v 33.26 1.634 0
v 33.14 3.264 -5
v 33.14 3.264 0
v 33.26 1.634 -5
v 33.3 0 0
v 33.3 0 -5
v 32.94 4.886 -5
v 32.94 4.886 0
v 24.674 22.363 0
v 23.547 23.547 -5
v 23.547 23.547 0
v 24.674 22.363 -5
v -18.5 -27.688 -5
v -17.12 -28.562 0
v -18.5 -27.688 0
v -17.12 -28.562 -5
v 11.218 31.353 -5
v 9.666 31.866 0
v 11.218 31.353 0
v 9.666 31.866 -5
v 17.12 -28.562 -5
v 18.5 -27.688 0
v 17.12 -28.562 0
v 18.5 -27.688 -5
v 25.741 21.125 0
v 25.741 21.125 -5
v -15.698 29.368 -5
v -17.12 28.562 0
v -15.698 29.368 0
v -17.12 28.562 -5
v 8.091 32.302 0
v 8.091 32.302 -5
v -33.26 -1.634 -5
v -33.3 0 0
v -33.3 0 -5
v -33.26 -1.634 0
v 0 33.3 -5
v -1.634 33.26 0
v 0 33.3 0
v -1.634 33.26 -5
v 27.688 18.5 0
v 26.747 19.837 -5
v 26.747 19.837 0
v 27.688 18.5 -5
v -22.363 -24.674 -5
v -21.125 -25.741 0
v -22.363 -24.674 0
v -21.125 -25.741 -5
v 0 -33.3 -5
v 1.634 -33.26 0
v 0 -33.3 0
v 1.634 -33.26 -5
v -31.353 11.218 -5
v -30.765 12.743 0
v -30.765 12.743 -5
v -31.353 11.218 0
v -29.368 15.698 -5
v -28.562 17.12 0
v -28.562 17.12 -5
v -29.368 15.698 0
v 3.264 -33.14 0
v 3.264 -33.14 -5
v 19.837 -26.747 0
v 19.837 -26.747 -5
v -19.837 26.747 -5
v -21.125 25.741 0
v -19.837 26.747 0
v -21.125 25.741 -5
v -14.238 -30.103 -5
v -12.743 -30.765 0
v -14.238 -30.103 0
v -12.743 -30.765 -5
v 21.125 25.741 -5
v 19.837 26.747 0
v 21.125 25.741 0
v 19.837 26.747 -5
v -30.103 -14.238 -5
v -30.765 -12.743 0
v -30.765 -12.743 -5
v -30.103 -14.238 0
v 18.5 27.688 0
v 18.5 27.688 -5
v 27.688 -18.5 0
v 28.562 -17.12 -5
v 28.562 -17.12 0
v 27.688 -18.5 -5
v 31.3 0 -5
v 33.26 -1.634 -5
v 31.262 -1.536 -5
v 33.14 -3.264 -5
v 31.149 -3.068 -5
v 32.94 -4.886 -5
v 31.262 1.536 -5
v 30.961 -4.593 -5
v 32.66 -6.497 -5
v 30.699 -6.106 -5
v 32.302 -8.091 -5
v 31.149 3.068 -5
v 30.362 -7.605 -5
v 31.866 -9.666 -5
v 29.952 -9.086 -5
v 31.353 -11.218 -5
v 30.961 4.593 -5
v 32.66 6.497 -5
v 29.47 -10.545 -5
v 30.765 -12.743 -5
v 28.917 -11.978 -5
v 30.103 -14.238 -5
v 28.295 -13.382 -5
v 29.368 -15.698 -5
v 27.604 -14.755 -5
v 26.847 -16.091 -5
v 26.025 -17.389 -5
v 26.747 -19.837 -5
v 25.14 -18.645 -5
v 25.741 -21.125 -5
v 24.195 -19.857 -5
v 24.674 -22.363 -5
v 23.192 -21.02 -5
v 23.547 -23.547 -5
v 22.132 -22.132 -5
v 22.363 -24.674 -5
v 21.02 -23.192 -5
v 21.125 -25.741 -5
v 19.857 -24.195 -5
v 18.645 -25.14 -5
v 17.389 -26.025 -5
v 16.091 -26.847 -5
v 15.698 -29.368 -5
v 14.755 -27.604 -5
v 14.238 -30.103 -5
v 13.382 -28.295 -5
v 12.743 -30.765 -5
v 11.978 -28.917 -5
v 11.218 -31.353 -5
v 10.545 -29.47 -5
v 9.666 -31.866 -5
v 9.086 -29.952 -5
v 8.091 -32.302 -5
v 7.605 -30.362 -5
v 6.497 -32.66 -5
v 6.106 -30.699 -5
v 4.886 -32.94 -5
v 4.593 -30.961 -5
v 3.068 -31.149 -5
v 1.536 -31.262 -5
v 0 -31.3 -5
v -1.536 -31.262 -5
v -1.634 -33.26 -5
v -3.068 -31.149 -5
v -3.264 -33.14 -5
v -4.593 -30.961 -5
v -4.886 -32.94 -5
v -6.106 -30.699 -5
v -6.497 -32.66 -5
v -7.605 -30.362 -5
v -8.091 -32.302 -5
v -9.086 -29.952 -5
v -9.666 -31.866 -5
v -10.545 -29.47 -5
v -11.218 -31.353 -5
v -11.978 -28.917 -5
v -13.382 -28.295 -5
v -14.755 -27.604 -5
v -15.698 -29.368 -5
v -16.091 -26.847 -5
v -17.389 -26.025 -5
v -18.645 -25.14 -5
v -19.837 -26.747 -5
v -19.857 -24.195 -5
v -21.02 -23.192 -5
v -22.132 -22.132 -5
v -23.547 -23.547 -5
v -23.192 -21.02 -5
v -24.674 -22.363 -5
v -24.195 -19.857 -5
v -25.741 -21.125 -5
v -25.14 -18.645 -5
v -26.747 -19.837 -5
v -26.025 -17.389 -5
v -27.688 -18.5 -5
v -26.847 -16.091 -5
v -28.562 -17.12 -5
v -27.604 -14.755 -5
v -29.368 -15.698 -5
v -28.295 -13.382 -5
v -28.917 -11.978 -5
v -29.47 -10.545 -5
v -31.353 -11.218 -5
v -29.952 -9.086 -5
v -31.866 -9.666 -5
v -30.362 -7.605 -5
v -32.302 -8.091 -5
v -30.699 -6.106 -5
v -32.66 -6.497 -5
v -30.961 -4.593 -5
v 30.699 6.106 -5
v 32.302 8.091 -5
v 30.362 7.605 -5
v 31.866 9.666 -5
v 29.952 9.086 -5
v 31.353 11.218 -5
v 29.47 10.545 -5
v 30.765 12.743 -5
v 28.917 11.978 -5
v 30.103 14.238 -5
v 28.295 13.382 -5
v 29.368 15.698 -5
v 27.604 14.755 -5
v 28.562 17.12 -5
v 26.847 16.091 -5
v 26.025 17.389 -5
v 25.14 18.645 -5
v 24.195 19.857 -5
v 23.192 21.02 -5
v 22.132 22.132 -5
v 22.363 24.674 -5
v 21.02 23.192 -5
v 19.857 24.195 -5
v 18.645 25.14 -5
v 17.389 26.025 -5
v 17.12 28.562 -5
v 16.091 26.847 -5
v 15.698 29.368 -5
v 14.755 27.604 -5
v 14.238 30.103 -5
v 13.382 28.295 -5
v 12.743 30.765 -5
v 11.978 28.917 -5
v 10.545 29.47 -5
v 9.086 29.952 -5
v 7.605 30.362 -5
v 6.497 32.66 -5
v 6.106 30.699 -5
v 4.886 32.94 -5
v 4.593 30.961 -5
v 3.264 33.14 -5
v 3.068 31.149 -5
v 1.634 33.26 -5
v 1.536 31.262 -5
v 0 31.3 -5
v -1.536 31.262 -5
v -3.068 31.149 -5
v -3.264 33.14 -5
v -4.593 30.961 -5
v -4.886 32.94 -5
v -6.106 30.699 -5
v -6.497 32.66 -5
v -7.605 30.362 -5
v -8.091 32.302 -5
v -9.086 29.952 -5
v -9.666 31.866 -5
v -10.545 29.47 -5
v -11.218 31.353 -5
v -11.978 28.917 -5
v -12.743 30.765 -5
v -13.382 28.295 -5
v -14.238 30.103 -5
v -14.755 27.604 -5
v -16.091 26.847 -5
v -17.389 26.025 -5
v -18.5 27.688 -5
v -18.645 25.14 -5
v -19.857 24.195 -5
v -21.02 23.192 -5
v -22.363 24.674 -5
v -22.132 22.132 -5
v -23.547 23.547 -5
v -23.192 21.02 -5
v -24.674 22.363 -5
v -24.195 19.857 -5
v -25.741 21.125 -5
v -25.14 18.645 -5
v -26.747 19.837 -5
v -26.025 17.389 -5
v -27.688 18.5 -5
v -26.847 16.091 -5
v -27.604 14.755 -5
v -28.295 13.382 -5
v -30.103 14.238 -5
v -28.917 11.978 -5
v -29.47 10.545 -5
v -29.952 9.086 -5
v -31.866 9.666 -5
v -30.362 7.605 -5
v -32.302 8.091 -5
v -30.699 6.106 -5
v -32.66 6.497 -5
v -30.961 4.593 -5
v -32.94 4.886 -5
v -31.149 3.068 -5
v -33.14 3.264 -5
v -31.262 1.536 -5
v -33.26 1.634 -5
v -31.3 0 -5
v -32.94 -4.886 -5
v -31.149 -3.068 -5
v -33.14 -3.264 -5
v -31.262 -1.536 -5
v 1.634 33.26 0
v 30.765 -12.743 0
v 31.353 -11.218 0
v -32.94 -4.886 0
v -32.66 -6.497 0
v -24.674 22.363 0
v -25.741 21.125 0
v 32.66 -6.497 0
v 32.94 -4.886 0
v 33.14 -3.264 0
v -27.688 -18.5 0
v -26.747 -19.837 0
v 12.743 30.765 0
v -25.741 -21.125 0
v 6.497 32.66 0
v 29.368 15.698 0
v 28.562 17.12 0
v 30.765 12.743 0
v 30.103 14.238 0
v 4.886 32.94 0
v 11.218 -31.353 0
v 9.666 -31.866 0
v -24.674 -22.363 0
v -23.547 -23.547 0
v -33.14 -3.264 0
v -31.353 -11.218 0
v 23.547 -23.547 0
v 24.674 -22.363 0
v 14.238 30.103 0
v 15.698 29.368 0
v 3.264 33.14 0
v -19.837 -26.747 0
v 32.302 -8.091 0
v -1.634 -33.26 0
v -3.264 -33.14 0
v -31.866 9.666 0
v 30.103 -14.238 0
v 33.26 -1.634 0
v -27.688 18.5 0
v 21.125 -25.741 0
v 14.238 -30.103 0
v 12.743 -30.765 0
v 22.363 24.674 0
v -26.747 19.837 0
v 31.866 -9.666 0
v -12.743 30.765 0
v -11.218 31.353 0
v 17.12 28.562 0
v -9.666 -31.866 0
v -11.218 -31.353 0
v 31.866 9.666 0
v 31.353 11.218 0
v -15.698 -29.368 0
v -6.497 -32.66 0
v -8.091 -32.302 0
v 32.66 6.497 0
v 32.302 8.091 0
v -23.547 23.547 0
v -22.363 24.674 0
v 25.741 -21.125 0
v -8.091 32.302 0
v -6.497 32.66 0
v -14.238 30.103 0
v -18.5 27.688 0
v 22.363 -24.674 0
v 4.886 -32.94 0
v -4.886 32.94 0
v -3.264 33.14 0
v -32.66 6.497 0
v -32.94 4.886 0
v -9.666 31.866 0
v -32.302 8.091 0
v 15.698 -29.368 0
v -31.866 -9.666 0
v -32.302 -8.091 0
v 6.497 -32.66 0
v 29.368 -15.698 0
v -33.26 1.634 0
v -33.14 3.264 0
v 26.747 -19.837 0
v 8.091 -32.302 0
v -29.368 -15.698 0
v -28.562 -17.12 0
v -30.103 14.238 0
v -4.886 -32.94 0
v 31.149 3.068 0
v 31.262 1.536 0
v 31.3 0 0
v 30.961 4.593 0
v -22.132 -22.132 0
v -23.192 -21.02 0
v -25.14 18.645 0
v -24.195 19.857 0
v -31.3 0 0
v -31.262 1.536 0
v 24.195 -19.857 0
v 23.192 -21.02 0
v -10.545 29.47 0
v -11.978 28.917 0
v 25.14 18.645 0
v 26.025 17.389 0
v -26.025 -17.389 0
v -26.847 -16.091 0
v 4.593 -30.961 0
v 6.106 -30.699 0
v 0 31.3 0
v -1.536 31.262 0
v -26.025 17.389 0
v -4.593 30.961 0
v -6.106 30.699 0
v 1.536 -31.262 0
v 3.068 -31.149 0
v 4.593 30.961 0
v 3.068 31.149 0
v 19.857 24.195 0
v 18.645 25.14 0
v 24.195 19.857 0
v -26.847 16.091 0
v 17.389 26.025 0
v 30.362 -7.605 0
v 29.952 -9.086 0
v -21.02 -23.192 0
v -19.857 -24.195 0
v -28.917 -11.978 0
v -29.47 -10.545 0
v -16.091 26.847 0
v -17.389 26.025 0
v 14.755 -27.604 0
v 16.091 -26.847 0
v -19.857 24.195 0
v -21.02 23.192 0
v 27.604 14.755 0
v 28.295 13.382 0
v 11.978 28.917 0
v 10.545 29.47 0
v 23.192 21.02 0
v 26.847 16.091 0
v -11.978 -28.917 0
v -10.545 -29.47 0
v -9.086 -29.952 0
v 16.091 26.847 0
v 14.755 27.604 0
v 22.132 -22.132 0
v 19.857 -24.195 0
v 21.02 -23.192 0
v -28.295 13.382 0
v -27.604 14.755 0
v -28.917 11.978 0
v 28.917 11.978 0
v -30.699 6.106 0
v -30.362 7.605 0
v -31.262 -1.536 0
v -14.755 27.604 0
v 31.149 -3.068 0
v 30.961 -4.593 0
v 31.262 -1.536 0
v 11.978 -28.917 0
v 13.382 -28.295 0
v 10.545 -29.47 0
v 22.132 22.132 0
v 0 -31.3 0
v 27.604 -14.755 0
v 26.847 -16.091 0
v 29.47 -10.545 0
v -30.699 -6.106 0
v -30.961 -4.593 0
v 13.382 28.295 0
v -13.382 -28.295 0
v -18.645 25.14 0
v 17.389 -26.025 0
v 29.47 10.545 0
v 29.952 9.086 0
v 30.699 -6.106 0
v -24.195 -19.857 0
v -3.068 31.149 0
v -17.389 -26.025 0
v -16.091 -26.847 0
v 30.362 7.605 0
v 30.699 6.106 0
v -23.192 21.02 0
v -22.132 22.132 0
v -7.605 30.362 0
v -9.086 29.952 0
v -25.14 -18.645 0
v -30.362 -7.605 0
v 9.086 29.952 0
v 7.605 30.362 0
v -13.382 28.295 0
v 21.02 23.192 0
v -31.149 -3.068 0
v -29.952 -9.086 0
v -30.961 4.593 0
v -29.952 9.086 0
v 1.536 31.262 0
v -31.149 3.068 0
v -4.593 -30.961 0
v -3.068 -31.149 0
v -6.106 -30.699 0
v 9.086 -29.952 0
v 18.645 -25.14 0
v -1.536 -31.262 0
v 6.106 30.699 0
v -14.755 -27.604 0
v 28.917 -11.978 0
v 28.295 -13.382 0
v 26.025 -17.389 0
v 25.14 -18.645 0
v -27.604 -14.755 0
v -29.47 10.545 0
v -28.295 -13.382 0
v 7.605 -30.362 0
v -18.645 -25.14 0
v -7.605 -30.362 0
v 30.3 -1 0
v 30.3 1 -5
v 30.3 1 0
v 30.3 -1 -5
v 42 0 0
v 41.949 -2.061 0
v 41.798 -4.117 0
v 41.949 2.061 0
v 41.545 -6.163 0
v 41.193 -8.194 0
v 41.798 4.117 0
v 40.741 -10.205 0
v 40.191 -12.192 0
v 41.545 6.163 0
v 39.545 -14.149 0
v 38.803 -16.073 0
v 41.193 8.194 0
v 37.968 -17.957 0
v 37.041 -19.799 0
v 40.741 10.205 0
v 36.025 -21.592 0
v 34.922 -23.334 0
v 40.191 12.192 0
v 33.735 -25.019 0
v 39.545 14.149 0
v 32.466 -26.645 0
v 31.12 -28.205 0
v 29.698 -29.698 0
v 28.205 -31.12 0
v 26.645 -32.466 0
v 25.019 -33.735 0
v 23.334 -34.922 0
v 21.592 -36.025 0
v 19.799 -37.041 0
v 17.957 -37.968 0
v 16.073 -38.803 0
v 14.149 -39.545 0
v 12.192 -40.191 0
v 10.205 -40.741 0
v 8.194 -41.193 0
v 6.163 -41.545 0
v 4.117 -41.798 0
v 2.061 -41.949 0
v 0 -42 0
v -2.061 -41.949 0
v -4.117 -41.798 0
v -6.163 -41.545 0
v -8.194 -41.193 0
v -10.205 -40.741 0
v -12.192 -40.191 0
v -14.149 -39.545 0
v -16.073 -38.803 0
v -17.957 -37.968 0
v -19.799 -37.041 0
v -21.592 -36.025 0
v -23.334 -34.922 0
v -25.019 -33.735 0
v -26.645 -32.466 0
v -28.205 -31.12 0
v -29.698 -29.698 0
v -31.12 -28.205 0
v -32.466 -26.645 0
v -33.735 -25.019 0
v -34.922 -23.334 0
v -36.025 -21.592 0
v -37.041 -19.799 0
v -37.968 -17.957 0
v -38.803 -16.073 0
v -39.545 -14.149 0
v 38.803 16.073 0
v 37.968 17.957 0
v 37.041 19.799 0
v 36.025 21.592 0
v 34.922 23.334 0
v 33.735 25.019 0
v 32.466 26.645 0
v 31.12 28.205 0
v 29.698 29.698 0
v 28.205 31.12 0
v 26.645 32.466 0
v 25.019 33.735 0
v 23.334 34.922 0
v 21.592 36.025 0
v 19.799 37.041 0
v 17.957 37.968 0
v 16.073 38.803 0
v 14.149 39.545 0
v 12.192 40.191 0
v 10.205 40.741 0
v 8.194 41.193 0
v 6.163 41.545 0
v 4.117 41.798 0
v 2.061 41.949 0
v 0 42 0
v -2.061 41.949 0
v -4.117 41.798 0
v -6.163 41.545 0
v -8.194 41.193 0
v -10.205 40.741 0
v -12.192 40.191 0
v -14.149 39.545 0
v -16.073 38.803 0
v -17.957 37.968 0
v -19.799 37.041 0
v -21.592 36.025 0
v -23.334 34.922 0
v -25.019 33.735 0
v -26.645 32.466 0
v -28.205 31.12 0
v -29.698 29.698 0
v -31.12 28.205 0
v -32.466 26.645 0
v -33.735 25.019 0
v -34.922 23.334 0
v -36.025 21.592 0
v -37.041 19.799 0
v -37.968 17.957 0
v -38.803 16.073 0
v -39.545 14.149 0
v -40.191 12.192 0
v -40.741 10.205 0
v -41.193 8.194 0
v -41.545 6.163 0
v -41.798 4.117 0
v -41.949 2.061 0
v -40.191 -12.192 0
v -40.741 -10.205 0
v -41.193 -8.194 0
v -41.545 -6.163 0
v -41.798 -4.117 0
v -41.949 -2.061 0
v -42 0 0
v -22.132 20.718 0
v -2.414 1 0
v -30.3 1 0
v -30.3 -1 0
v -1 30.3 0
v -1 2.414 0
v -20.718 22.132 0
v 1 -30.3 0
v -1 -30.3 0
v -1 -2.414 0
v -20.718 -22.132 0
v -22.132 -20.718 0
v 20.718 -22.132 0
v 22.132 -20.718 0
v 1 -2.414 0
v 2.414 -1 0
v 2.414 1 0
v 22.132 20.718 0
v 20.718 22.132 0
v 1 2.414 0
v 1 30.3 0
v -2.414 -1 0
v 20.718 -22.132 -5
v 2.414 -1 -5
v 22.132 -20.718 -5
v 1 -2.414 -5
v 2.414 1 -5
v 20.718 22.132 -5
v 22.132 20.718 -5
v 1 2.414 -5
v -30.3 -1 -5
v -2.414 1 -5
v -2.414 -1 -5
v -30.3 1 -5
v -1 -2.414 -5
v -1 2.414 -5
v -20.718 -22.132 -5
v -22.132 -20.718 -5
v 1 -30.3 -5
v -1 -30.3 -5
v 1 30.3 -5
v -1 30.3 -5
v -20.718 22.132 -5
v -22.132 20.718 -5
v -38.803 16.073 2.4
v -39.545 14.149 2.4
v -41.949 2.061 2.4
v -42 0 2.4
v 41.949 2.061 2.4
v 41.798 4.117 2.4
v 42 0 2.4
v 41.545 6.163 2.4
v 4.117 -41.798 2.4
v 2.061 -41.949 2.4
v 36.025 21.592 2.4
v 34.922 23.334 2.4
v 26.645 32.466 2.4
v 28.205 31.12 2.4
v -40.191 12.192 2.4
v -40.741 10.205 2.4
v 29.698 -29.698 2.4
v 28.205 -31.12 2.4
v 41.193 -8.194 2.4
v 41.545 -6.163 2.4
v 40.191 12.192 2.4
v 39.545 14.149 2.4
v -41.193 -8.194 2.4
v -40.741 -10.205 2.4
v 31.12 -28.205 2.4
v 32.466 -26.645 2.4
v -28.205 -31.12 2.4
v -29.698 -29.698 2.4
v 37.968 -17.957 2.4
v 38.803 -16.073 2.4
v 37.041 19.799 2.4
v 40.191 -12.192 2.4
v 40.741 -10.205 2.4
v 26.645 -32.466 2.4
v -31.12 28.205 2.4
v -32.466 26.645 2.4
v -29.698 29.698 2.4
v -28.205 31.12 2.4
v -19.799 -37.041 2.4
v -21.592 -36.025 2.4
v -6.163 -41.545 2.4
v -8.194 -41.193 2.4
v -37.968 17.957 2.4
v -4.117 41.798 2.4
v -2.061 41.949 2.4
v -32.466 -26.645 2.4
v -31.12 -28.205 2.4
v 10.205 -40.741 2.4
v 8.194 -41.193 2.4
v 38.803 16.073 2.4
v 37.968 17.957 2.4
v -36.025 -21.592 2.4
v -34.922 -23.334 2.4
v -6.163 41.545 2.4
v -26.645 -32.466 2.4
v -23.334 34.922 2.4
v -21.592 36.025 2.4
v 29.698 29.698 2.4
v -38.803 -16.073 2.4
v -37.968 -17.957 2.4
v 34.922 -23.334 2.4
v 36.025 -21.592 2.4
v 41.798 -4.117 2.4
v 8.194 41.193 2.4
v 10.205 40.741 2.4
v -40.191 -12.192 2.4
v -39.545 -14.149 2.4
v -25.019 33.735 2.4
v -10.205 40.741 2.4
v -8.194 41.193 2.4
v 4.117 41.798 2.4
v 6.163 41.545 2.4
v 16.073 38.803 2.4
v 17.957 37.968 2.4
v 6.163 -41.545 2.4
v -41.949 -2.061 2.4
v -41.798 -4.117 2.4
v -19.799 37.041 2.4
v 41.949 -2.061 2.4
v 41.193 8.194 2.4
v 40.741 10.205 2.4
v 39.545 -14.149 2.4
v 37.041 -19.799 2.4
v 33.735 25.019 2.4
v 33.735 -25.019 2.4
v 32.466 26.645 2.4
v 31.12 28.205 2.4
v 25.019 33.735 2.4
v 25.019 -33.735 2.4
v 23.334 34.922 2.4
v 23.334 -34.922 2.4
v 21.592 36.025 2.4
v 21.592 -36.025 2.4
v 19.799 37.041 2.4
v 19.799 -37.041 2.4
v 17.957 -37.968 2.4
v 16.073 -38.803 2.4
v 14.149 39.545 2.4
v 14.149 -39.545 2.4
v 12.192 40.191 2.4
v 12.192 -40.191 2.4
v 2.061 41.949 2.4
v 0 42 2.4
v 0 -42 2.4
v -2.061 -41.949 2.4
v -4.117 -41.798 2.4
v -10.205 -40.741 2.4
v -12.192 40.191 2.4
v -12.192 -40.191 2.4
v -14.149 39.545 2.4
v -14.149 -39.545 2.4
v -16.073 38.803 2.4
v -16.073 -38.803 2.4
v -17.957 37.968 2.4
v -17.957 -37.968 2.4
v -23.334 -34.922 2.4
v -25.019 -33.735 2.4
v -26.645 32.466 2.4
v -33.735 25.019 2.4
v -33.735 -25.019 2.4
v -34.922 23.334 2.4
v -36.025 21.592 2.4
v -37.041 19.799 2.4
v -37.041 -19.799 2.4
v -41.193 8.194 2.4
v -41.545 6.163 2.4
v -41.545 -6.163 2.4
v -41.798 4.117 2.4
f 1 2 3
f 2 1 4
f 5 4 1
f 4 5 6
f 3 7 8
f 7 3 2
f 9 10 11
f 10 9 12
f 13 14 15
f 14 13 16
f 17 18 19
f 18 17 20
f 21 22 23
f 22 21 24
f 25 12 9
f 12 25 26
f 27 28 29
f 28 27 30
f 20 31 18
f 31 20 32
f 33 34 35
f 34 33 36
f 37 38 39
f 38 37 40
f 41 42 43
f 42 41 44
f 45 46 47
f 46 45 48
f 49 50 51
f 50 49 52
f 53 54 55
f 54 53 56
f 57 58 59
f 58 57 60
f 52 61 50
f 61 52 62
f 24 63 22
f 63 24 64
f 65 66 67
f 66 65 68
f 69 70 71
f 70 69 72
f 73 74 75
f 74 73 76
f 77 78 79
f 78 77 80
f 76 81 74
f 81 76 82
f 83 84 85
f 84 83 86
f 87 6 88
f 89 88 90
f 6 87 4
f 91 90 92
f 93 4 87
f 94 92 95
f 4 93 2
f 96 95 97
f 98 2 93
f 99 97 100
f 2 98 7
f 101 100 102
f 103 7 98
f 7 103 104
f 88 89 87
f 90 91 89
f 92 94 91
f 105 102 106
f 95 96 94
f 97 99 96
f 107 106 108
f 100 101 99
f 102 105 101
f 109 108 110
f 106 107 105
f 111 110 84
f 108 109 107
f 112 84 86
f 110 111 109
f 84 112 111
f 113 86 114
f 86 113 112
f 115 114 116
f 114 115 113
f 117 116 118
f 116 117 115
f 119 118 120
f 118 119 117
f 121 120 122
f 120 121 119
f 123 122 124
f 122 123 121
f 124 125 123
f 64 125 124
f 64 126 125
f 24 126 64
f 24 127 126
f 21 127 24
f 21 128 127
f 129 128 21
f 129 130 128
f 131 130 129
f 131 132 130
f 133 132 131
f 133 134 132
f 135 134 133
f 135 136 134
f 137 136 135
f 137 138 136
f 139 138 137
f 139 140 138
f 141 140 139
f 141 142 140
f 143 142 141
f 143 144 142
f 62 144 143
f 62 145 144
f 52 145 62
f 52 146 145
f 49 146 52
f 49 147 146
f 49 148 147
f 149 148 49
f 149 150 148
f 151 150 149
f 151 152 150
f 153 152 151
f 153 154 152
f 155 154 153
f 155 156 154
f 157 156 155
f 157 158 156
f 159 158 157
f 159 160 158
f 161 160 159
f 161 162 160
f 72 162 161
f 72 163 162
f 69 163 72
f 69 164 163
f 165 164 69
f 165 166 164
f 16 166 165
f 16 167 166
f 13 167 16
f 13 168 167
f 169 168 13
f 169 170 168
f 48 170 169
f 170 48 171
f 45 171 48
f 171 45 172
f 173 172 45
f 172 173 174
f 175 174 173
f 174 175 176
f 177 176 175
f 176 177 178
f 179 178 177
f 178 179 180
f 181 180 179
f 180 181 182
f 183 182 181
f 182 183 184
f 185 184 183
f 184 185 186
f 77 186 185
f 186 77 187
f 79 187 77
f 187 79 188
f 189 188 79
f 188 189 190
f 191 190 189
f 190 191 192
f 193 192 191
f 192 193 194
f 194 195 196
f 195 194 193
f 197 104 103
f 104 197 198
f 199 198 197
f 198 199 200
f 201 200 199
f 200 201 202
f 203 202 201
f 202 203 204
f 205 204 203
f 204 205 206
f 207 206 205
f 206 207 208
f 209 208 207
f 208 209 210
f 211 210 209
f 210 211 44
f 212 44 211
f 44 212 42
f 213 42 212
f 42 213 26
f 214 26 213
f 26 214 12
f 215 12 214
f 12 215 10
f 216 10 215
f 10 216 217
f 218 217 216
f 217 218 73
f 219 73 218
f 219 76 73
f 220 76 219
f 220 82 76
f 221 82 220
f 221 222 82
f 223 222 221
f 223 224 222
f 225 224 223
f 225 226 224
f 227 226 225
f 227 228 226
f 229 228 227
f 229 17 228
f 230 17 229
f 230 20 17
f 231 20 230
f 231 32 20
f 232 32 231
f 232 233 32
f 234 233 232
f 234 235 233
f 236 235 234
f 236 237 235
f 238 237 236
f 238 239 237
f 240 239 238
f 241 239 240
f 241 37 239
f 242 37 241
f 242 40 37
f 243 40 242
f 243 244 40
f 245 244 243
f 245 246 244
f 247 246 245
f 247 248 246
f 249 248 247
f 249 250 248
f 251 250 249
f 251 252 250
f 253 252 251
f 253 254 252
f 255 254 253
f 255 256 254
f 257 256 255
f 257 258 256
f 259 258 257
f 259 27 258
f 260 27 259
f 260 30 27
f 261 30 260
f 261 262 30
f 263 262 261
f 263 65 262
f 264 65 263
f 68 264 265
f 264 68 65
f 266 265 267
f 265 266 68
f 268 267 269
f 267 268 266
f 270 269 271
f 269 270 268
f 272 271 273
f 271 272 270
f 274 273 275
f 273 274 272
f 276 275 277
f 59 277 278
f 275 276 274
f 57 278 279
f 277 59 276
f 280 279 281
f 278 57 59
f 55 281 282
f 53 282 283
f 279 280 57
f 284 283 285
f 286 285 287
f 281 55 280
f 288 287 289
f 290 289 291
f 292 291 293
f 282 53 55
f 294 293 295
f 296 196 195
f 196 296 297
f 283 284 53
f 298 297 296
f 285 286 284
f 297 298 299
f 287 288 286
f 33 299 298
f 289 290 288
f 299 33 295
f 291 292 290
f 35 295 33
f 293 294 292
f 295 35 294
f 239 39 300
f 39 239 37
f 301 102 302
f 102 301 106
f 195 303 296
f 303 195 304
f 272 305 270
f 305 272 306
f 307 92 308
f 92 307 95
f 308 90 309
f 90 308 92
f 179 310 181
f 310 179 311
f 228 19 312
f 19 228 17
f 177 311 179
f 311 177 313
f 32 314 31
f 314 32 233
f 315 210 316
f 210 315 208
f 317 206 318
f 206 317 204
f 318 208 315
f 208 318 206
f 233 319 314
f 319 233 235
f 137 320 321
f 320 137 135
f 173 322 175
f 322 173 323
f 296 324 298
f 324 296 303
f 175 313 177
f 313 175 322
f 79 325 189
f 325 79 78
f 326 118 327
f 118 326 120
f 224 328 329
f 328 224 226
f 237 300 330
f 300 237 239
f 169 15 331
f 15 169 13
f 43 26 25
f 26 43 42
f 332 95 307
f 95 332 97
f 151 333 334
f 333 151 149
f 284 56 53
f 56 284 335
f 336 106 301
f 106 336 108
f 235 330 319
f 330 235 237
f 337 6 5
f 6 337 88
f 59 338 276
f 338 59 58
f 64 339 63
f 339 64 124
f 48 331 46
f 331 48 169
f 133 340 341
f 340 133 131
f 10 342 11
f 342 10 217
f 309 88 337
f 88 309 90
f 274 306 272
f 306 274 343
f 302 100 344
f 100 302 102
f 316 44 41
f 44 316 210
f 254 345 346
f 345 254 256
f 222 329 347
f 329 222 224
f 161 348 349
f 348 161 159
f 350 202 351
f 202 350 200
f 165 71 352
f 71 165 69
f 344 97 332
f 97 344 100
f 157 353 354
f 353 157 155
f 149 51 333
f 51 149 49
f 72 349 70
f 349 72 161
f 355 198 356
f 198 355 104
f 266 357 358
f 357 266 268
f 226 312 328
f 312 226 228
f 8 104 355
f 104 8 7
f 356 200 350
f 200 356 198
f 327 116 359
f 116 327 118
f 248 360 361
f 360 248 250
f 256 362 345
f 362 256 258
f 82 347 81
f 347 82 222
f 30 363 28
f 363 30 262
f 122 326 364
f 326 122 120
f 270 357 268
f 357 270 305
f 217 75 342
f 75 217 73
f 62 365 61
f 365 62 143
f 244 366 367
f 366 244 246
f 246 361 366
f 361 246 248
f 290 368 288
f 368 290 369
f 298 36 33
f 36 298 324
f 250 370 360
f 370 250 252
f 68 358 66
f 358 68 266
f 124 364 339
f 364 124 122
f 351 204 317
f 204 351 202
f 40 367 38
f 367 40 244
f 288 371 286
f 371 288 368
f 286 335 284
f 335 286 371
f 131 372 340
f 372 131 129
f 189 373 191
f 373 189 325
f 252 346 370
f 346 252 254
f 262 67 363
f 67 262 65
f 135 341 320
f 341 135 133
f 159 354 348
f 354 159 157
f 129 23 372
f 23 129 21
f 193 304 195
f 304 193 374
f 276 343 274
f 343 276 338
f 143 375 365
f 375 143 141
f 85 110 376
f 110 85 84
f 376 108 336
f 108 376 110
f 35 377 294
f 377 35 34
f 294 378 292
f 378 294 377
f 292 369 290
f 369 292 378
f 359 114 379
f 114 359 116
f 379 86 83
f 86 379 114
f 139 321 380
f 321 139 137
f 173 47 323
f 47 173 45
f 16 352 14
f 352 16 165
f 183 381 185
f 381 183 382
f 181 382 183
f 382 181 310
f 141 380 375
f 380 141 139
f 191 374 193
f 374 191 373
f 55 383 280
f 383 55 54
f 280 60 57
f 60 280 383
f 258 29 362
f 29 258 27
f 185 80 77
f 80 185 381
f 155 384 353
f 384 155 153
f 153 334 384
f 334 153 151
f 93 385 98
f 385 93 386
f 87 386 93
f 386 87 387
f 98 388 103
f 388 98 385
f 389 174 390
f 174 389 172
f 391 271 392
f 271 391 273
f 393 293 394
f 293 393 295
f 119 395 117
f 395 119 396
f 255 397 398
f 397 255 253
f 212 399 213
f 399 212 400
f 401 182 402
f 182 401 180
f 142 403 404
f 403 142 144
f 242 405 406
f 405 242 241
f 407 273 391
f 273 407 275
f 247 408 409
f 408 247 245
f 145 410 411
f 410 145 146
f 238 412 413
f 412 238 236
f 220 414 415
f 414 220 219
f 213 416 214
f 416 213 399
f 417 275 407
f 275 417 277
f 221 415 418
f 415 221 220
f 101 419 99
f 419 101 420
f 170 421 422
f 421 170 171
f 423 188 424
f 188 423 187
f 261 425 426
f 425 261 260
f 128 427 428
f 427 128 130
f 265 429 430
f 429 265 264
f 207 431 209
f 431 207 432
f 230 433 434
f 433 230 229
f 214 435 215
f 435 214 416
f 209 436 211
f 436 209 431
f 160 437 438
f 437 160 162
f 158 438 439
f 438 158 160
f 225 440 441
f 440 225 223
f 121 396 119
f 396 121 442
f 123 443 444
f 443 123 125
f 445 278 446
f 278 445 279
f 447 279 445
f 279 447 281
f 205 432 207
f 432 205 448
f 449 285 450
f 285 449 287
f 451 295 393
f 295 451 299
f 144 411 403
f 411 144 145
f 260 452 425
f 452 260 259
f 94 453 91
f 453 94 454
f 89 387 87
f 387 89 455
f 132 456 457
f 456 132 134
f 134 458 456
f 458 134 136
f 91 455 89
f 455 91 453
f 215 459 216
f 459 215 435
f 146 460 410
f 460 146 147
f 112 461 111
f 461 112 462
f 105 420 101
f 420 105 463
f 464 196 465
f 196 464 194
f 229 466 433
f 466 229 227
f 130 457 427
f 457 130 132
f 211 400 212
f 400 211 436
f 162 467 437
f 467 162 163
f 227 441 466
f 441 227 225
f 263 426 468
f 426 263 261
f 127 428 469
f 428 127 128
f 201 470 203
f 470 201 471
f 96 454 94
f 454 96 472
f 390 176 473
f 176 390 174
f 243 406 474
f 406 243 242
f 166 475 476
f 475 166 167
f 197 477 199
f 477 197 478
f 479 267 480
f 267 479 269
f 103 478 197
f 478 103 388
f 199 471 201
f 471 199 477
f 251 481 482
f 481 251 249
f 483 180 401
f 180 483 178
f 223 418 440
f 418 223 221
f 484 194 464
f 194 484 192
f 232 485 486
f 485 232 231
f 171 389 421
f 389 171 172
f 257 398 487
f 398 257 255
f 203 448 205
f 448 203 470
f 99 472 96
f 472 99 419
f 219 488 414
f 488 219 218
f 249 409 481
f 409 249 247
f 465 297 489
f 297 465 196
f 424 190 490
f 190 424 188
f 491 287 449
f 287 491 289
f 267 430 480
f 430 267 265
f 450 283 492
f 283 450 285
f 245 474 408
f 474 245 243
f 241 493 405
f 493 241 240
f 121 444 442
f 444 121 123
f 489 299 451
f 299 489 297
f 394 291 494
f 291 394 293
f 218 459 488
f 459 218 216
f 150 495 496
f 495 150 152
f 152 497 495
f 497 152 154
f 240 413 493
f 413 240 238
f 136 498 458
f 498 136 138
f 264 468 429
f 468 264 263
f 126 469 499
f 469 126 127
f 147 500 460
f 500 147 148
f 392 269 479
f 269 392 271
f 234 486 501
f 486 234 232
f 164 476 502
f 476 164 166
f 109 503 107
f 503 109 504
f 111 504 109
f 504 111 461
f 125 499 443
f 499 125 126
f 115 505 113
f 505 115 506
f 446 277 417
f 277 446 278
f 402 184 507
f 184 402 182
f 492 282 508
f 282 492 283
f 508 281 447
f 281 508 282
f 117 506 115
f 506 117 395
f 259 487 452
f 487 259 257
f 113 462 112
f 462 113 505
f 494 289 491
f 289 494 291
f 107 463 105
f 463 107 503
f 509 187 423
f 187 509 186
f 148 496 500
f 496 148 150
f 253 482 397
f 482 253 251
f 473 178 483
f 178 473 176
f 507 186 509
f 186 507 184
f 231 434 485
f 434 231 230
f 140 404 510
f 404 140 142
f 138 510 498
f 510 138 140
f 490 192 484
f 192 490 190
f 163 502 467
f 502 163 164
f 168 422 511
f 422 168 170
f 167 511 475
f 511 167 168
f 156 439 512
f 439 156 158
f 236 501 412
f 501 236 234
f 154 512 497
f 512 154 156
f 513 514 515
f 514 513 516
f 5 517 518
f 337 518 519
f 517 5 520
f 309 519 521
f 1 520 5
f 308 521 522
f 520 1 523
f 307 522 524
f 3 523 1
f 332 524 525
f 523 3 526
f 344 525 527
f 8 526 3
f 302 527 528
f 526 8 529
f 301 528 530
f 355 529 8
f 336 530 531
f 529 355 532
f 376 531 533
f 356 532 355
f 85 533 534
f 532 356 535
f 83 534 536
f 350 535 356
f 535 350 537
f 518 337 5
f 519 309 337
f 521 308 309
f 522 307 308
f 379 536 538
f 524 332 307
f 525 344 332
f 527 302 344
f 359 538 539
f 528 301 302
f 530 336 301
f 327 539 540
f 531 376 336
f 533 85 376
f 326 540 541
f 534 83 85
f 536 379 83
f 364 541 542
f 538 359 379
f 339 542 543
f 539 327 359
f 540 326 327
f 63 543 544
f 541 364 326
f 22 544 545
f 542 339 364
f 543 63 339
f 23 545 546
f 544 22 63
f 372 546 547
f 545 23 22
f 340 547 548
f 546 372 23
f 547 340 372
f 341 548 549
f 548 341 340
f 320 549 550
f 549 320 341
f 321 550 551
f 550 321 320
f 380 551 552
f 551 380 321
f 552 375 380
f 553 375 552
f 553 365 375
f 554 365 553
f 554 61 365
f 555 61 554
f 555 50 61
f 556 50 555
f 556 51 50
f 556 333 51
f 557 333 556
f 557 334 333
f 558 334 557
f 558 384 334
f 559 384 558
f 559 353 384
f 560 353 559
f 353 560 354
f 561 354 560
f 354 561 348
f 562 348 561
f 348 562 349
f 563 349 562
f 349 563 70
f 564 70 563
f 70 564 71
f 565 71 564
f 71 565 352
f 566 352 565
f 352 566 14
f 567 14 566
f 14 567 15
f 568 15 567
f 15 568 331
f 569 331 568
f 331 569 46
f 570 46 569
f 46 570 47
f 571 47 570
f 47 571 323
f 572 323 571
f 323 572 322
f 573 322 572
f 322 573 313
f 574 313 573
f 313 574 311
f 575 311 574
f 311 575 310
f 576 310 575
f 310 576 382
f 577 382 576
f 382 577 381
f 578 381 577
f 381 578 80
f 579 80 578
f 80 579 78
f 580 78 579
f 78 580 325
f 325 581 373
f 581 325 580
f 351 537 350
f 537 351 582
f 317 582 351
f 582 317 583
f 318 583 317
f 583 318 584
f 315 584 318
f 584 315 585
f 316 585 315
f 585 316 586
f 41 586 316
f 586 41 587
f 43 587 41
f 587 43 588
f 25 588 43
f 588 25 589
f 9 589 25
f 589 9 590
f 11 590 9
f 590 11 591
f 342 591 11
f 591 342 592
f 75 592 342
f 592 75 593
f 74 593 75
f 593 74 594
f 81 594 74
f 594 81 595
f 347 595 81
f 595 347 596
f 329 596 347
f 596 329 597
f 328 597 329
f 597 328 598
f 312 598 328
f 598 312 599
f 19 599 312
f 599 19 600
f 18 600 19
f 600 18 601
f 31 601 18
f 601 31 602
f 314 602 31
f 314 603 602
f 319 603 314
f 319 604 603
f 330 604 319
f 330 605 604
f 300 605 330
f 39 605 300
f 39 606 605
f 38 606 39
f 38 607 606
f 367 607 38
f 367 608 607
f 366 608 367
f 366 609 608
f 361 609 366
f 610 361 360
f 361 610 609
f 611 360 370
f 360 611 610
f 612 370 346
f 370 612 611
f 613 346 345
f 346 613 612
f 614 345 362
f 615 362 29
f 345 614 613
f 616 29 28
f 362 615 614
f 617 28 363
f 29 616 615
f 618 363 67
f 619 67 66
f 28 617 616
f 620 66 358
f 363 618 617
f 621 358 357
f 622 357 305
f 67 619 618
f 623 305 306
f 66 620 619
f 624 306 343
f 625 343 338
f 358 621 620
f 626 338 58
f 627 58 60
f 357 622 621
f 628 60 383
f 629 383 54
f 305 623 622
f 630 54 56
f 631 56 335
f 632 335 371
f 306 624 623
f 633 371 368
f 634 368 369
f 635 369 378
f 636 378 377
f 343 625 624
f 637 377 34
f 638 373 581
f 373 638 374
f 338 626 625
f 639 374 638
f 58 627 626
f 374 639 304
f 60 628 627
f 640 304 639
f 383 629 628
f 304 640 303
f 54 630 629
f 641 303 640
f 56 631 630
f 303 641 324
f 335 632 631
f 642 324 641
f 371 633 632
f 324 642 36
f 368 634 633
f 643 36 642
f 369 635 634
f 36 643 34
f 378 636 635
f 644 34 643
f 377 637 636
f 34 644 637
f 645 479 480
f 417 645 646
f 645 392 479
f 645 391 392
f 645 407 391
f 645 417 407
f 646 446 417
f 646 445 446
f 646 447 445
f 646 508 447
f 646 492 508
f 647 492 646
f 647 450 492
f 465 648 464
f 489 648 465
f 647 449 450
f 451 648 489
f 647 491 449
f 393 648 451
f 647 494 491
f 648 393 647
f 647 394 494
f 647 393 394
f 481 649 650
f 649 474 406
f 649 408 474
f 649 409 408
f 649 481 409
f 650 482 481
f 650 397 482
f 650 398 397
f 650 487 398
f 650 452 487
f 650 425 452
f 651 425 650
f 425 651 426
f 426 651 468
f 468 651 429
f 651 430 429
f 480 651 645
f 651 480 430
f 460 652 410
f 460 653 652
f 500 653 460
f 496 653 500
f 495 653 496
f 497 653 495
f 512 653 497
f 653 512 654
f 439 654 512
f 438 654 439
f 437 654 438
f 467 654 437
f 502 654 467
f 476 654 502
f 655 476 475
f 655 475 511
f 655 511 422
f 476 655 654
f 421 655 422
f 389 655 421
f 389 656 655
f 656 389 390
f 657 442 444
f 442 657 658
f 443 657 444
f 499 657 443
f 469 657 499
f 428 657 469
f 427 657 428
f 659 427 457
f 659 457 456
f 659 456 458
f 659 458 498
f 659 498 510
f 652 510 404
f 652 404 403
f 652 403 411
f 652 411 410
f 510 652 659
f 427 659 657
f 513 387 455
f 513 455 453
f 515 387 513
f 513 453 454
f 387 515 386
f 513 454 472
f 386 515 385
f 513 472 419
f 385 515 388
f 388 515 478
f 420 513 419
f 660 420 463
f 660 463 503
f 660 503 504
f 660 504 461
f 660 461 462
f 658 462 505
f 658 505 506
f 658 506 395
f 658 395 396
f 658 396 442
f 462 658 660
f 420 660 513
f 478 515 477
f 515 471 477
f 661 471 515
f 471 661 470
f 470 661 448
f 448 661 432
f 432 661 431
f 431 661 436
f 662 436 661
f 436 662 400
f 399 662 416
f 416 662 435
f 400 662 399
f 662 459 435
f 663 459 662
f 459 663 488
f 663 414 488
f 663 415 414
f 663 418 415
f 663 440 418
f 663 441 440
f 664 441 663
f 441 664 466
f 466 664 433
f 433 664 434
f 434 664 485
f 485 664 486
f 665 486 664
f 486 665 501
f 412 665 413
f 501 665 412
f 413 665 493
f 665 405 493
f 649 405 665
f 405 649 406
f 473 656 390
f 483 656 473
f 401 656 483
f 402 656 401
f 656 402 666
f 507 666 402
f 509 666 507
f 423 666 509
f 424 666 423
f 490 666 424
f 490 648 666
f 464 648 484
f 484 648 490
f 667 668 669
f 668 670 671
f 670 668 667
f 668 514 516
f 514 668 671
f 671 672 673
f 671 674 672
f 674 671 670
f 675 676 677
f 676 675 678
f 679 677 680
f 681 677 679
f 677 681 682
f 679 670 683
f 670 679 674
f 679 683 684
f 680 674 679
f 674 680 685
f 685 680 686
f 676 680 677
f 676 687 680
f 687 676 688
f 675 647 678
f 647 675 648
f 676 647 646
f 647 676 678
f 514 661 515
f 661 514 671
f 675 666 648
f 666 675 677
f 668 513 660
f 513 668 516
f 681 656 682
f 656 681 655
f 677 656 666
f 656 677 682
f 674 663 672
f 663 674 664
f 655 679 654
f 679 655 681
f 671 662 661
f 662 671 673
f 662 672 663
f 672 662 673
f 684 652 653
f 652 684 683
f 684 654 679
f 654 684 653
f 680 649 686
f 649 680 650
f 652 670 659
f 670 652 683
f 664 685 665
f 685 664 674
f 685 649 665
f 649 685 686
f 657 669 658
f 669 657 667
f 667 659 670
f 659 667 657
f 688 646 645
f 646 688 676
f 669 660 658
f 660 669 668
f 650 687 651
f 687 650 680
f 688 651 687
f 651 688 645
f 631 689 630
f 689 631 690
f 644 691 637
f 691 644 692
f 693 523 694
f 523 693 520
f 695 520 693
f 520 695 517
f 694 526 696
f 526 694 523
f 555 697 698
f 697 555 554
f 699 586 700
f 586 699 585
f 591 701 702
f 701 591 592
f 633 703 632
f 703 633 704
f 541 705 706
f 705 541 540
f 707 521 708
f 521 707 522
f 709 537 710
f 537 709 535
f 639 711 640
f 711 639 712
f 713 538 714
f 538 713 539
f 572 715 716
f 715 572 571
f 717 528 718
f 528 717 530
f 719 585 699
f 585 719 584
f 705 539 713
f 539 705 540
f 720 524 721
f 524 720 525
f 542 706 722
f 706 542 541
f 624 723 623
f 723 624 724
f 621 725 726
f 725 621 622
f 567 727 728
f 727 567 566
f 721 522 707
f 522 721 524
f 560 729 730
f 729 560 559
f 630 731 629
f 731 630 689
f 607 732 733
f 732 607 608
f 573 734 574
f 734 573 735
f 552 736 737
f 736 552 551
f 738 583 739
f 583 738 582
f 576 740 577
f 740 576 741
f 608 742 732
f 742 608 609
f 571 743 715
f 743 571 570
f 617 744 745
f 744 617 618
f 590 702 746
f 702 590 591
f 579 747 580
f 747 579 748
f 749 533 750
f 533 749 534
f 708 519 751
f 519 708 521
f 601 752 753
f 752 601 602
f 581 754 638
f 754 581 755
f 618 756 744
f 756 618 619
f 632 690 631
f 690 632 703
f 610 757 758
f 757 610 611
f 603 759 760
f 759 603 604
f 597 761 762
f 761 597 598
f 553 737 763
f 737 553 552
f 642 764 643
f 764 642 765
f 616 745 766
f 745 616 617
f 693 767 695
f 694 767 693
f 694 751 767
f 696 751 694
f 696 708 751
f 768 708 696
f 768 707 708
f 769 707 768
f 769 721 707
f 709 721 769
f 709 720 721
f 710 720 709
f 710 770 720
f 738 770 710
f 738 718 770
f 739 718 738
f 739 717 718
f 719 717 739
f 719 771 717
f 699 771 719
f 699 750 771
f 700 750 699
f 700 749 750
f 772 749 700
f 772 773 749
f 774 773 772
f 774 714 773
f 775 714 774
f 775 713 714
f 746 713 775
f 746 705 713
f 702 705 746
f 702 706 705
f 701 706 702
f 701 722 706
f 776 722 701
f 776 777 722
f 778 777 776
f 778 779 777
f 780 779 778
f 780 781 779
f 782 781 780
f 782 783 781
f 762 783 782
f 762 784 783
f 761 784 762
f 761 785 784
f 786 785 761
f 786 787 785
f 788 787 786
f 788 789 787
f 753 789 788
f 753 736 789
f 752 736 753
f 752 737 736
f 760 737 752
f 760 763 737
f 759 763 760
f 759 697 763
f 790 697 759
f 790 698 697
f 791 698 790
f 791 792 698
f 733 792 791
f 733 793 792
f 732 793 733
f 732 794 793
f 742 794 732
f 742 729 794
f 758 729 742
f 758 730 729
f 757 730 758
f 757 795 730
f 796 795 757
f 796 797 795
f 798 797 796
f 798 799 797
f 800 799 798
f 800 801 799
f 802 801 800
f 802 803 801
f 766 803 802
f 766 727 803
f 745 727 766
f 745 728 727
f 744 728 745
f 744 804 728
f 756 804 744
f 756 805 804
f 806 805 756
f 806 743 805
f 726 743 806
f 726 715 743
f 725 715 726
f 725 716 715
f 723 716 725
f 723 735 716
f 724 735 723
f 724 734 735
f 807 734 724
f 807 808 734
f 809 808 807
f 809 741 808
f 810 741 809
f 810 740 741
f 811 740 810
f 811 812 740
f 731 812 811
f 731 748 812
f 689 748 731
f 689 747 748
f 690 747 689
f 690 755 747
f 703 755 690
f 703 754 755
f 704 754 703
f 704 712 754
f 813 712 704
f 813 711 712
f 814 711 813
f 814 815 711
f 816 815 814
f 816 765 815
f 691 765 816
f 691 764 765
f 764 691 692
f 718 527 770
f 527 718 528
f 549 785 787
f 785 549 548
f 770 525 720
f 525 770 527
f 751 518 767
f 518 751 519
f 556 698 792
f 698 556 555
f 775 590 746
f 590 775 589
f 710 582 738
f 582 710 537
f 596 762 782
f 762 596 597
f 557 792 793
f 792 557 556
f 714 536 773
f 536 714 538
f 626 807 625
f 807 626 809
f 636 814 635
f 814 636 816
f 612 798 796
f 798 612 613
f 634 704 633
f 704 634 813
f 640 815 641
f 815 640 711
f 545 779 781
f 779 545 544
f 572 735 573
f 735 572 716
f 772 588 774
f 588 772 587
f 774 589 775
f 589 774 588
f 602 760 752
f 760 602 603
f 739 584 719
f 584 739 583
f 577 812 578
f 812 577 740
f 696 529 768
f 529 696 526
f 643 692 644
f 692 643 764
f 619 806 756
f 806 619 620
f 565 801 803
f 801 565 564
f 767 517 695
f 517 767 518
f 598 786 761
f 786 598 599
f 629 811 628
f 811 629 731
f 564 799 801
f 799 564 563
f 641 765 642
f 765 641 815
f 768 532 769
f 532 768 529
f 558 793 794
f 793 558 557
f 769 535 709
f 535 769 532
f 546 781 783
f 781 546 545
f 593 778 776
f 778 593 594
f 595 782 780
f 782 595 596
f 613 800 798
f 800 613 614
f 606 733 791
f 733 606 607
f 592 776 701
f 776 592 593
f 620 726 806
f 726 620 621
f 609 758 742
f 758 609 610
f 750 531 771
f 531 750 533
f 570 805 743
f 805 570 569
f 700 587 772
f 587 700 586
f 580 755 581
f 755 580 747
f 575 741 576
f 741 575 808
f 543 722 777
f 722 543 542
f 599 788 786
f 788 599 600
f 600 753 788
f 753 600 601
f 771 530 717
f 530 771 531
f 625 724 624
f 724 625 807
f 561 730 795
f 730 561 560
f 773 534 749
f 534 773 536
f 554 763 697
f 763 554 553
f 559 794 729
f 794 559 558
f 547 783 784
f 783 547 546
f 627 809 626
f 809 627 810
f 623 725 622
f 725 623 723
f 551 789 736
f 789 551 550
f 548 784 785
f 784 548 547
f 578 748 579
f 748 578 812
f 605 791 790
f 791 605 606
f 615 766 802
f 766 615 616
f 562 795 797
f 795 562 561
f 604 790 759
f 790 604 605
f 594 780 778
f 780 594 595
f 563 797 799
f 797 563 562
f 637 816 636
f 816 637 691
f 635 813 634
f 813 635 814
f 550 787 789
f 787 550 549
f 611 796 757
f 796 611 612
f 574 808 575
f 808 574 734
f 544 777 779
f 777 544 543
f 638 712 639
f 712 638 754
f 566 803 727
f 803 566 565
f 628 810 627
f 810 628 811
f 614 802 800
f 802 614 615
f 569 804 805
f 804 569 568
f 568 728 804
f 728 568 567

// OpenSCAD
$fn = 128;

epsilon = 0.02;

jar_opening_diameter = 74;       // [50:0.5:120] Jar opening diameter in mm
insert_clearance = 0.8;         // [0.2:0.1:2] Total diameter clearance for the seeder body fit
wall_thickness = 3;             // [2:0.5:6] Seeder wall thickness in mm
flange_overlap = 4;             // [2:0.5:12] Seeder flange radial overlap in mm
lid_top_thickness = 2.4;        // [1:0.2:5] Light-blocking top thickness in mm
lid_cover_overlap = 1;          // [0:0.2:6] Radial lid overhang beyond the seeder flange in mm
lid_inset_depth = 5;            // [1:0.5:20] Depth of the locating inset under the lid in mm
lid_inset_clearance = 0.6;      // [0.2:0.1:2] Total diameter clearance for the locating inset
lid_inset_wall_thickness = 2;   // [1:0.2:5] Wall thickness of the hollow locating inset
support_rib_count = 4;          // [0:1:8] Number of rib rotations inside the hollow inset
support_rib_width = 2;          // [0.8:0.2:6] Width of each strengthening rib in mm

outer_top_diameter = jar_opening_diameter - insert_clearance;
inner_top_diameter = outer_top_diameter - 2 * wall_thickness;
flange_outer_diameter = jar_opening_diameter + 2 * flange_overlap;
lid_outer_diameter = flange_outer_diameter + 2 * lid_cover_overlap;
lid_inset_outer_diameter = inner_top_diameter - lid_inset_clearance;
lid_inset_inner_diameter = lid_inset_outer_diameter - 2 * lid_inset_wall_thickness;

assert(inner_top_diameter > 0, "Seeder inner diameter must stay positive.");
assert(lid_outer_diameter >= flange_outer_diameter, "Lid must cover the seeder flange.");
assert(lid_inset_outer_diameter > 0, "Inset outer diameter must stay positive.");
assert(lid_inset_inner_diameter > 0, "Inset wall thickness is too large.");
assert(lid_inset_depth > 0, "Inset depth must be positive.");
assert(support_rib_count >= 0, "Support rib count must be non-negative.");
assert(support_rib_width > 0 && support_rib_width < lid_inset_inner_diameter, "Support rib width is out of range.");

module support_ribs() {
    if (support_rib_count > 0) {
        for (index = [0 : support_rib_count - 1]) {
            rotate([0, 0, index * 180 / support_rib_count])
                translate([0, 0, -lid_inset_depth / 2])
                    cube([
                        lid_inset_inner_diameter - support_rib_width,
                        support_rib_width,
                        lid_inset_depth
                    ], center = true);
        }
    }
}

module locating_inset() {
    translate([0, 0, -lid_inset_depth])
        difference() {
            cylinder(h = lid_inset_depth + epsilon, d = lid_inset_outer_diameter);
            translate([0, 0, -epsilon])
                cylinder(h = lid_inset_depth + 3 * epsilon, d = lid_inset_inner_diameter);
        }
}

module germination_lid() {
    union() {
        cylinder(h = lid_top_thickness, d = lid_outer_diameter);
        locating_inset();
        support_ribs();
    }
}

germination_lid();
